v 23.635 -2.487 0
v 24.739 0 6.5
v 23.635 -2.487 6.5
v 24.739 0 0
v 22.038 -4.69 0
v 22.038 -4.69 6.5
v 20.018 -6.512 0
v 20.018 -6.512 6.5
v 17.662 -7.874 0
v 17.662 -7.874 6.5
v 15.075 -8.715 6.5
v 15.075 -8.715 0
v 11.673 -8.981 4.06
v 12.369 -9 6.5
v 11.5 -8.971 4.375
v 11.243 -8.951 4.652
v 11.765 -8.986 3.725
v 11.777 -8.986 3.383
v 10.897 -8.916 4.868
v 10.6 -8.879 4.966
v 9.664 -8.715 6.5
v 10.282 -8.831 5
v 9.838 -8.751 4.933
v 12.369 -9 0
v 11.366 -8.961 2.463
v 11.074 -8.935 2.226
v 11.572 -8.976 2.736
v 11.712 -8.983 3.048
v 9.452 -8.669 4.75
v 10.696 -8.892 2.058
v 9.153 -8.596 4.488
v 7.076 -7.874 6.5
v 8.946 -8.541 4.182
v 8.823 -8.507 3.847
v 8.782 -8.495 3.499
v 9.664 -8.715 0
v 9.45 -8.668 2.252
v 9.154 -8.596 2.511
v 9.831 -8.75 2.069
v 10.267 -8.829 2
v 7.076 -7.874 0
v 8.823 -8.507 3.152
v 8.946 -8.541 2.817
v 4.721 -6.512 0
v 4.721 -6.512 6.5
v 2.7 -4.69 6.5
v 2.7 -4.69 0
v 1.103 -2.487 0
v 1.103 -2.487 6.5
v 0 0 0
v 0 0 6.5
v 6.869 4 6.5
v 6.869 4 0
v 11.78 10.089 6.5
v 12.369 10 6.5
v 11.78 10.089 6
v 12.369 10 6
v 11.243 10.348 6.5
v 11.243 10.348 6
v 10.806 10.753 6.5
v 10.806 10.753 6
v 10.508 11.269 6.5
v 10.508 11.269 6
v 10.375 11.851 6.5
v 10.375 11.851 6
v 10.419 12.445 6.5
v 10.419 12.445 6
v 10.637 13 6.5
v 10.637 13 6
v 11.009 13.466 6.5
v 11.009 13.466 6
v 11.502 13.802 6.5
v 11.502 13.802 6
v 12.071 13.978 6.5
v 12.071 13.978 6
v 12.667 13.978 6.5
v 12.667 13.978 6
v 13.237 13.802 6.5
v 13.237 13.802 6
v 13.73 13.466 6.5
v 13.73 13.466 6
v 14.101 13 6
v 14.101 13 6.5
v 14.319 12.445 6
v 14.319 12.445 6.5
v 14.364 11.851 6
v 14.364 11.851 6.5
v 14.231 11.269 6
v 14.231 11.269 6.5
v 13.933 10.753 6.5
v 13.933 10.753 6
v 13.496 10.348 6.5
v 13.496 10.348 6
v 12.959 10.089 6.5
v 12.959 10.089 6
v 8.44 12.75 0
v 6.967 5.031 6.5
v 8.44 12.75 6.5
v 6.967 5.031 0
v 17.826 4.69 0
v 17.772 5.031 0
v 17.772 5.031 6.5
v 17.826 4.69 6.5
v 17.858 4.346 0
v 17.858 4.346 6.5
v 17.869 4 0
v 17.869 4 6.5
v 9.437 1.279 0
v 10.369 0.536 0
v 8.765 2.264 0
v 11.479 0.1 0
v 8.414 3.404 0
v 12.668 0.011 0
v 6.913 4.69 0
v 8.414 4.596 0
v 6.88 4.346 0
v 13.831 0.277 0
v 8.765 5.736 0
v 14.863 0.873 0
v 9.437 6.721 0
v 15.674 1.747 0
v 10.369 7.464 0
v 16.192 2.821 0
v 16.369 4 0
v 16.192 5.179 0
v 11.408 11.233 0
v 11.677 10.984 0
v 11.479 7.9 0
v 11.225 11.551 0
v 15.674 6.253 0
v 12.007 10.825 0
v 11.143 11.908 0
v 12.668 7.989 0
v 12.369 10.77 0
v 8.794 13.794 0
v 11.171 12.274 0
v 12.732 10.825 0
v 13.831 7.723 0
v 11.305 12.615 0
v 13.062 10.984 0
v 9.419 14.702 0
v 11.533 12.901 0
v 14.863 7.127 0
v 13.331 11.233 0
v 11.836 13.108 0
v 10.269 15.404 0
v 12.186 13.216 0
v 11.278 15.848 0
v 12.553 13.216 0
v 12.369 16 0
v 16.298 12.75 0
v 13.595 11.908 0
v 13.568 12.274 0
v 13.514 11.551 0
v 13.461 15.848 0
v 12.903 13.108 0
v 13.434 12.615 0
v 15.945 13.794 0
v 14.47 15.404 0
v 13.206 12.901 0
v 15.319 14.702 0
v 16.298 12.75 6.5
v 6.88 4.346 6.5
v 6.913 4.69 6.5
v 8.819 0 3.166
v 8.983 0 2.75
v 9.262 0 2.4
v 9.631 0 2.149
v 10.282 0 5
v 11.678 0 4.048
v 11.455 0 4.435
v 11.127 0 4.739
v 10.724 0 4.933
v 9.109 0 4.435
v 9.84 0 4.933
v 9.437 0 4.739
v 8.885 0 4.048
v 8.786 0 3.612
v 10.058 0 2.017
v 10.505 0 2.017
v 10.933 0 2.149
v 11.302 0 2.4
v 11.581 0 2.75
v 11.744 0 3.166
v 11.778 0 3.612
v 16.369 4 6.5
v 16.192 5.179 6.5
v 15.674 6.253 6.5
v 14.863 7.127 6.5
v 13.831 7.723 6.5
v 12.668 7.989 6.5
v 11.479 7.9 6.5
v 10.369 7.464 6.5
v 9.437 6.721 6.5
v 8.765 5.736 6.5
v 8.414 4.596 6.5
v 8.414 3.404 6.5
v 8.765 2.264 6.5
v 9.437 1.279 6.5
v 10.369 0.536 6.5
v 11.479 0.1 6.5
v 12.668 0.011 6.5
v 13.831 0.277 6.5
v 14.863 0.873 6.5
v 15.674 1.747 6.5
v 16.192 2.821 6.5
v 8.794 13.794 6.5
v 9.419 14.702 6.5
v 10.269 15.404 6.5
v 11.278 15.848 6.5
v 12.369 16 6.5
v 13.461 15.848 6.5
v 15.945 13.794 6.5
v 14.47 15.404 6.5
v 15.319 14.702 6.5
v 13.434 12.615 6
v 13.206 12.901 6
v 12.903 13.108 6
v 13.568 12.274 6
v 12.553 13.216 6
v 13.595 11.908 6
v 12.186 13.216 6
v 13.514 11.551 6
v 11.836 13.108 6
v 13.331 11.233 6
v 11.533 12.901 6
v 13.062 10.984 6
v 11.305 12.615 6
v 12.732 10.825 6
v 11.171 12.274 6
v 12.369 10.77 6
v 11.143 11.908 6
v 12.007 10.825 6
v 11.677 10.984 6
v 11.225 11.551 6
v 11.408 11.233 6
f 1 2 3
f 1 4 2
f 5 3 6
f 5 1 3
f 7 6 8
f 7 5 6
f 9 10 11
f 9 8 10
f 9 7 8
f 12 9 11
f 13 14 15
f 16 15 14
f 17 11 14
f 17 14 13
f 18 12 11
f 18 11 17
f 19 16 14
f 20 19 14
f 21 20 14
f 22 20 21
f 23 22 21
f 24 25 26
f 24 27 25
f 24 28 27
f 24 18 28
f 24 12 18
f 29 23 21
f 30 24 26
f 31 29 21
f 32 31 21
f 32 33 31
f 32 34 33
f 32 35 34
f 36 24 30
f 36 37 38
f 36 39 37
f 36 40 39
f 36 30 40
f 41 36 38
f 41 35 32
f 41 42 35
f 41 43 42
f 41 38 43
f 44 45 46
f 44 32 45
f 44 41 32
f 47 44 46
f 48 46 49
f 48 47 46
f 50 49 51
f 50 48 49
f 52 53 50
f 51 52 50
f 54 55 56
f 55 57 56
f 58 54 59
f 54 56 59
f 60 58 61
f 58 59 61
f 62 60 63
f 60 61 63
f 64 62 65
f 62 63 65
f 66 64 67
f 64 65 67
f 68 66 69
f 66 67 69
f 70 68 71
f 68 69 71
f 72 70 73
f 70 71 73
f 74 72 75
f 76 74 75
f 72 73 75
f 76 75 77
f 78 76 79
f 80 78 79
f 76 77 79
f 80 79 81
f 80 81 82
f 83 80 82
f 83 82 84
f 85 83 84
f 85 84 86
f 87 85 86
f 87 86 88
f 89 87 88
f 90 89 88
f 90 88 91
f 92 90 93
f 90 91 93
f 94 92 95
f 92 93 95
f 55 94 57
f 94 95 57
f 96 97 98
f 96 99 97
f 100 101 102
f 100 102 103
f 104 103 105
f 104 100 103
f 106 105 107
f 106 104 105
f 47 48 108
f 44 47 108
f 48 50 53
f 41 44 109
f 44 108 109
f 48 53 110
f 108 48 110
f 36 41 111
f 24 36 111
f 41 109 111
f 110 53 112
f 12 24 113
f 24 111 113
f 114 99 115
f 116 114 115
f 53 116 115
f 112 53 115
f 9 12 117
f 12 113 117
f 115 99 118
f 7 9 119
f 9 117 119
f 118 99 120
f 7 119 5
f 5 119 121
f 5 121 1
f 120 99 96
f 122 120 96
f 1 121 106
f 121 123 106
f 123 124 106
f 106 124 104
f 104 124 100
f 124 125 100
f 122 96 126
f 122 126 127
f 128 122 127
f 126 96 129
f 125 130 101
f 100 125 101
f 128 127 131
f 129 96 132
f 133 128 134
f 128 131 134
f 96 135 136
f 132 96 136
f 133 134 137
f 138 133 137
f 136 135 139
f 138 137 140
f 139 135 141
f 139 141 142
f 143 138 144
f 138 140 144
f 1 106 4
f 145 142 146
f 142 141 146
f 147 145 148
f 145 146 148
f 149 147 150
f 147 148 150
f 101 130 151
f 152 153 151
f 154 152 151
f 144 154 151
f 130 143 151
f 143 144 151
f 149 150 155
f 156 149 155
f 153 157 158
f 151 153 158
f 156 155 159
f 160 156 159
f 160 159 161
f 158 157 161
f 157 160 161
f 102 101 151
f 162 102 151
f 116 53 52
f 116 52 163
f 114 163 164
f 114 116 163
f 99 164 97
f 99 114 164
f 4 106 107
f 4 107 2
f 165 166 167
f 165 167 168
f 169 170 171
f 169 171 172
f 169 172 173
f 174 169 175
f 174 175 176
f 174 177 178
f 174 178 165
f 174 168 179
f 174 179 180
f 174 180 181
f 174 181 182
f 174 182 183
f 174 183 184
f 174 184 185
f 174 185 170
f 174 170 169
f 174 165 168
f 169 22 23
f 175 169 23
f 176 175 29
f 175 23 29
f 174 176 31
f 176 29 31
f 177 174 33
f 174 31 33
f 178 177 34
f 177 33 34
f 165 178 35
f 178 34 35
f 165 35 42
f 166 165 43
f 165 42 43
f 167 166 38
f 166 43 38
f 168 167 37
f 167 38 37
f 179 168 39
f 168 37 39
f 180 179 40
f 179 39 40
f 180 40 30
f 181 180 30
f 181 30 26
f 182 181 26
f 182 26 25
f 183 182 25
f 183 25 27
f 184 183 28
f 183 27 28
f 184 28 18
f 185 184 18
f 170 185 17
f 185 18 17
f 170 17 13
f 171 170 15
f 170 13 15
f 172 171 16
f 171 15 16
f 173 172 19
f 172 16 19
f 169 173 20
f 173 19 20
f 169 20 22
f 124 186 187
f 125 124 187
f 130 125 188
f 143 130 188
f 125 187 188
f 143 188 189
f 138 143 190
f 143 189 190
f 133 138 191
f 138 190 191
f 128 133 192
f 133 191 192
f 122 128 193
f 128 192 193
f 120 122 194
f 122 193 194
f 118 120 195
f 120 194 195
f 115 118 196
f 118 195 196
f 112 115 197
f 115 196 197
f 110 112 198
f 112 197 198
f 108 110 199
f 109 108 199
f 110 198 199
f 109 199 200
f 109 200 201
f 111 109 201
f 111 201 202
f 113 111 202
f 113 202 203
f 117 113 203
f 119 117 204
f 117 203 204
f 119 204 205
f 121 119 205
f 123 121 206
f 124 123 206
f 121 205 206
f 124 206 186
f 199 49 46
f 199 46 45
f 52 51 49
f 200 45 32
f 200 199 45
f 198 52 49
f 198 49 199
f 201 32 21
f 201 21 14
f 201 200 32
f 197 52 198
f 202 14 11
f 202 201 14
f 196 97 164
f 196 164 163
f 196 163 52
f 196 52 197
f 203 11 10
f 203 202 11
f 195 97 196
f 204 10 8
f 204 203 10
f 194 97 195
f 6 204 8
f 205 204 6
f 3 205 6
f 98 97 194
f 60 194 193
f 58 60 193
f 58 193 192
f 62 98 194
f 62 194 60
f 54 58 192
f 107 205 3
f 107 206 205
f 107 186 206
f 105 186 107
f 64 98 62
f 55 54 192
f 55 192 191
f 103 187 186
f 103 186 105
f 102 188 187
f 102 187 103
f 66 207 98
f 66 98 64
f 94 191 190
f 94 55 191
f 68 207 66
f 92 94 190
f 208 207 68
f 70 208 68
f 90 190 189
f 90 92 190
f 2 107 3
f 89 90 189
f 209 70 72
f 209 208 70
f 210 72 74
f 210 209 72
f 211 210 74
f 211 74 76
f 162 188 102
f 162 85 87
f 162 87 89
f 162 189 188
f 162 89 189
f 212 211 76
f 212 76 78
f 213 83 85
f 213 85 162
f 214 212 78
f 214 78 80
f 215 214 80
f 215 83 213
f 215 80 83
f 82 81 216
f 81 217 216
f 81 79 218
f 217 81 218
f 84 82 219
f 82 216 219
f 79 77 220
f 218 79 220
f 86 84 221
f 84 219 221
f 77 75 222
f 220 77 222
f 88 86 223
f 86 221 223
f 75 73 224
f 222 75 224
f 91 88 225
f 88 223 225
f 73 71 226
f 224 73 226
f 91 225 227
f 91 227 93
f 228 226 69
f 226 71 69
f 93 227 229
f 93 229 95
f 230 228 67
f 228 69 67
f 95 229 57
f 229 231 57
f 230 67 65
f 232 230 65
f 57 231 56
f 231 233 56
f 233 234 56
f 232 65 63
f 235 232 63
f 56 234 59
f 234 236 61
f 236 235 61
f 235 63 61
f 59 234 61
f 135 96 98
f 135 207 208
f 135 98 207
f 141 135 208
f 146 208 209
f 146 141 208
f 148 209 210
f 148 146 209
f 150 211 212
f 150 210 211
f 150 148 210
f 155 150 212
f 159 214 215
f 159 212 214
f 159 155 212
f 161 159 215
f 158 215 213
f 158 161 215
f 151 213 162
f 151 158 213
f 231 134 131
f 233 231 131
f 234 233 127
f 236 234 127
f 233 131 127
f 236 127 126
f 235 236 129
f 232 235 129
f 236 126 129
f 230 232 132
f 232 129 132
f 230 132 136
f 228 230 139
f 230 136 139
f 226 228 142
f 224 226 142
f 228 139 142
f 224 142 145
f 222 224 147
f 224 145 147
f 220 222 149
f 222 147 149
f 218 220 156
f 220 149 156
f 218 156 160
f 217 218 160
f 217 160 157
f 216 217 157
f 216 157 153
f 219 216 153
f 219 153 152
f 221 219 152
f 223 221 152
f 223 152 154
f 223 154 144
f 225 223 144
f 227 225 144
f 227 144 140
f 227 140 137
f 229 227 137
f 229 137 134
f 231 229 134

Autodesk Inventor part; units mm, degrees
ref_plane "YZ Plane" through (0, 0, 0) normal (1, 0, 0) x (0, 1, 0)
ref_plane "XY Plane" through (0, 0, 0) normal (0, 0, 1) x (1, 0, 0)
sketch "Skizze1" plane through (0, 0, 0) normal (0, 0, 1) x (1, 0, 0)
  line L0 (-2.6307, 4) -> (27.3693, 4) construction
  arc A0 (0, 0) -> (24.7386, 0) centre (12.3693, 4) ccw
  circle A1 centre (12.3693, 4) radius 5.5
  line L1 (17.8693, 4) -> (24.7386, 0)
  line L2 (6.8693, 4) -> (0, 0)
  line L3 (6.9669, 5.0312) -> (8.4403, 12.75)
  line L4 (17.7718, 5.0312) -> (16.2984, 12.75)
  arc A2 (16.2984, 12.75) -> (8.4403, 12.75) centre (12.3693, 12) ccw
  dimension "d2" = 26
  dimension "d3" = 11
  dimension "d4" = 4
  dimension "d5" = 4
  dimension "d6" = 8
extrude "Extrusion1" add sketch "Skizze1" along normal blind 6.5
sketch "Skizze2" plane through (0, 0, 6.5) normal (0, 0, 1) x (1, 0, 0)
  arc A0 (17.8693, 4) -> (17.7718, 5.0312) centre (12.3693, 4) ccw projected
  line L0 (17.7718, 5.0312) -> (16.2984, 12.75) projected
  arc A1 (16.2984, 12.75) -> (8.4403, 12.75) centre (12.3693, 12) ccw projected
  line L1 (8.4403, 12.75) -> (6.9669, 5.0312) projected
  arc A2 (6.9669, 5.0312) -> (6.8693, 4) centre (12.3693, 4) ccw projected
  line L2 (6.8693, 4) -> (0, 0) projected
  arc A3 (0, 0) -> (24.7386, 0) centre (12.3693, 4) ccw projected
  line L3 (24.7386, 0) -> (17.8693, 4) projected
  circle A4 centre (12.3693, 4) radius 4
  dimension "d9" = 8
extrude "Extrusion2" cut sketch "Skizze2" against normal up to surface (6.5 mm away) contours A4
sketch "Skizze3" plane through (0, 0, 6.5) normal (0, 0, 1) x (1, 0, 0)
  circle A0 centre (12.3693, 4) radius 4 projected
  point P0 (0, 0)
  point P1 (12.3693, 12)
  dimension "d12" = 8
hole "Bohrung1" at (12.3693, 12, 6.5) direction (0, 0, -1) diameter 2.459 depth 6.5 counterbore diameter 4 counterbore depth 0.5 thread size "M3x0.5" class "6H" standard "ISO Metric profile"
ref_plane "Arbeitsebene1" through (0, 0, 0) normal (0, 1, 0) x (-1, 0, 0)
sketch "Skizze4" plane through (0, 0, 0) normal (0, 1, 0) x (-1, 0, 0)
  line L0 (0, 6.5) -> (-24.7386, 6.5) projected
  line L1 (0, 0) -> (-24.7386, 0) projected
  line L2 (-24.7386, 0) -> (-24.7386, 6.5) projected
  line L3 (0, 6.5) -> (-24.7386, 6.5) projected
  line L4 (0, 0) -> (0, 6.5) projected
  point P0 (-12.3693, 6.5)
  point P1 (-10.2818, 3.5)
  point P2 (-12.3693, 6.5)
  dimension "d25" = 3
  dimension "d26" = 14.4568
hole "Bohrung2" at (10.2818, 0, 3.5) direction (0, -1, 0) diameter 3 end through all
properties part number "Kurbel" material "Stahl, galvanisiert"
